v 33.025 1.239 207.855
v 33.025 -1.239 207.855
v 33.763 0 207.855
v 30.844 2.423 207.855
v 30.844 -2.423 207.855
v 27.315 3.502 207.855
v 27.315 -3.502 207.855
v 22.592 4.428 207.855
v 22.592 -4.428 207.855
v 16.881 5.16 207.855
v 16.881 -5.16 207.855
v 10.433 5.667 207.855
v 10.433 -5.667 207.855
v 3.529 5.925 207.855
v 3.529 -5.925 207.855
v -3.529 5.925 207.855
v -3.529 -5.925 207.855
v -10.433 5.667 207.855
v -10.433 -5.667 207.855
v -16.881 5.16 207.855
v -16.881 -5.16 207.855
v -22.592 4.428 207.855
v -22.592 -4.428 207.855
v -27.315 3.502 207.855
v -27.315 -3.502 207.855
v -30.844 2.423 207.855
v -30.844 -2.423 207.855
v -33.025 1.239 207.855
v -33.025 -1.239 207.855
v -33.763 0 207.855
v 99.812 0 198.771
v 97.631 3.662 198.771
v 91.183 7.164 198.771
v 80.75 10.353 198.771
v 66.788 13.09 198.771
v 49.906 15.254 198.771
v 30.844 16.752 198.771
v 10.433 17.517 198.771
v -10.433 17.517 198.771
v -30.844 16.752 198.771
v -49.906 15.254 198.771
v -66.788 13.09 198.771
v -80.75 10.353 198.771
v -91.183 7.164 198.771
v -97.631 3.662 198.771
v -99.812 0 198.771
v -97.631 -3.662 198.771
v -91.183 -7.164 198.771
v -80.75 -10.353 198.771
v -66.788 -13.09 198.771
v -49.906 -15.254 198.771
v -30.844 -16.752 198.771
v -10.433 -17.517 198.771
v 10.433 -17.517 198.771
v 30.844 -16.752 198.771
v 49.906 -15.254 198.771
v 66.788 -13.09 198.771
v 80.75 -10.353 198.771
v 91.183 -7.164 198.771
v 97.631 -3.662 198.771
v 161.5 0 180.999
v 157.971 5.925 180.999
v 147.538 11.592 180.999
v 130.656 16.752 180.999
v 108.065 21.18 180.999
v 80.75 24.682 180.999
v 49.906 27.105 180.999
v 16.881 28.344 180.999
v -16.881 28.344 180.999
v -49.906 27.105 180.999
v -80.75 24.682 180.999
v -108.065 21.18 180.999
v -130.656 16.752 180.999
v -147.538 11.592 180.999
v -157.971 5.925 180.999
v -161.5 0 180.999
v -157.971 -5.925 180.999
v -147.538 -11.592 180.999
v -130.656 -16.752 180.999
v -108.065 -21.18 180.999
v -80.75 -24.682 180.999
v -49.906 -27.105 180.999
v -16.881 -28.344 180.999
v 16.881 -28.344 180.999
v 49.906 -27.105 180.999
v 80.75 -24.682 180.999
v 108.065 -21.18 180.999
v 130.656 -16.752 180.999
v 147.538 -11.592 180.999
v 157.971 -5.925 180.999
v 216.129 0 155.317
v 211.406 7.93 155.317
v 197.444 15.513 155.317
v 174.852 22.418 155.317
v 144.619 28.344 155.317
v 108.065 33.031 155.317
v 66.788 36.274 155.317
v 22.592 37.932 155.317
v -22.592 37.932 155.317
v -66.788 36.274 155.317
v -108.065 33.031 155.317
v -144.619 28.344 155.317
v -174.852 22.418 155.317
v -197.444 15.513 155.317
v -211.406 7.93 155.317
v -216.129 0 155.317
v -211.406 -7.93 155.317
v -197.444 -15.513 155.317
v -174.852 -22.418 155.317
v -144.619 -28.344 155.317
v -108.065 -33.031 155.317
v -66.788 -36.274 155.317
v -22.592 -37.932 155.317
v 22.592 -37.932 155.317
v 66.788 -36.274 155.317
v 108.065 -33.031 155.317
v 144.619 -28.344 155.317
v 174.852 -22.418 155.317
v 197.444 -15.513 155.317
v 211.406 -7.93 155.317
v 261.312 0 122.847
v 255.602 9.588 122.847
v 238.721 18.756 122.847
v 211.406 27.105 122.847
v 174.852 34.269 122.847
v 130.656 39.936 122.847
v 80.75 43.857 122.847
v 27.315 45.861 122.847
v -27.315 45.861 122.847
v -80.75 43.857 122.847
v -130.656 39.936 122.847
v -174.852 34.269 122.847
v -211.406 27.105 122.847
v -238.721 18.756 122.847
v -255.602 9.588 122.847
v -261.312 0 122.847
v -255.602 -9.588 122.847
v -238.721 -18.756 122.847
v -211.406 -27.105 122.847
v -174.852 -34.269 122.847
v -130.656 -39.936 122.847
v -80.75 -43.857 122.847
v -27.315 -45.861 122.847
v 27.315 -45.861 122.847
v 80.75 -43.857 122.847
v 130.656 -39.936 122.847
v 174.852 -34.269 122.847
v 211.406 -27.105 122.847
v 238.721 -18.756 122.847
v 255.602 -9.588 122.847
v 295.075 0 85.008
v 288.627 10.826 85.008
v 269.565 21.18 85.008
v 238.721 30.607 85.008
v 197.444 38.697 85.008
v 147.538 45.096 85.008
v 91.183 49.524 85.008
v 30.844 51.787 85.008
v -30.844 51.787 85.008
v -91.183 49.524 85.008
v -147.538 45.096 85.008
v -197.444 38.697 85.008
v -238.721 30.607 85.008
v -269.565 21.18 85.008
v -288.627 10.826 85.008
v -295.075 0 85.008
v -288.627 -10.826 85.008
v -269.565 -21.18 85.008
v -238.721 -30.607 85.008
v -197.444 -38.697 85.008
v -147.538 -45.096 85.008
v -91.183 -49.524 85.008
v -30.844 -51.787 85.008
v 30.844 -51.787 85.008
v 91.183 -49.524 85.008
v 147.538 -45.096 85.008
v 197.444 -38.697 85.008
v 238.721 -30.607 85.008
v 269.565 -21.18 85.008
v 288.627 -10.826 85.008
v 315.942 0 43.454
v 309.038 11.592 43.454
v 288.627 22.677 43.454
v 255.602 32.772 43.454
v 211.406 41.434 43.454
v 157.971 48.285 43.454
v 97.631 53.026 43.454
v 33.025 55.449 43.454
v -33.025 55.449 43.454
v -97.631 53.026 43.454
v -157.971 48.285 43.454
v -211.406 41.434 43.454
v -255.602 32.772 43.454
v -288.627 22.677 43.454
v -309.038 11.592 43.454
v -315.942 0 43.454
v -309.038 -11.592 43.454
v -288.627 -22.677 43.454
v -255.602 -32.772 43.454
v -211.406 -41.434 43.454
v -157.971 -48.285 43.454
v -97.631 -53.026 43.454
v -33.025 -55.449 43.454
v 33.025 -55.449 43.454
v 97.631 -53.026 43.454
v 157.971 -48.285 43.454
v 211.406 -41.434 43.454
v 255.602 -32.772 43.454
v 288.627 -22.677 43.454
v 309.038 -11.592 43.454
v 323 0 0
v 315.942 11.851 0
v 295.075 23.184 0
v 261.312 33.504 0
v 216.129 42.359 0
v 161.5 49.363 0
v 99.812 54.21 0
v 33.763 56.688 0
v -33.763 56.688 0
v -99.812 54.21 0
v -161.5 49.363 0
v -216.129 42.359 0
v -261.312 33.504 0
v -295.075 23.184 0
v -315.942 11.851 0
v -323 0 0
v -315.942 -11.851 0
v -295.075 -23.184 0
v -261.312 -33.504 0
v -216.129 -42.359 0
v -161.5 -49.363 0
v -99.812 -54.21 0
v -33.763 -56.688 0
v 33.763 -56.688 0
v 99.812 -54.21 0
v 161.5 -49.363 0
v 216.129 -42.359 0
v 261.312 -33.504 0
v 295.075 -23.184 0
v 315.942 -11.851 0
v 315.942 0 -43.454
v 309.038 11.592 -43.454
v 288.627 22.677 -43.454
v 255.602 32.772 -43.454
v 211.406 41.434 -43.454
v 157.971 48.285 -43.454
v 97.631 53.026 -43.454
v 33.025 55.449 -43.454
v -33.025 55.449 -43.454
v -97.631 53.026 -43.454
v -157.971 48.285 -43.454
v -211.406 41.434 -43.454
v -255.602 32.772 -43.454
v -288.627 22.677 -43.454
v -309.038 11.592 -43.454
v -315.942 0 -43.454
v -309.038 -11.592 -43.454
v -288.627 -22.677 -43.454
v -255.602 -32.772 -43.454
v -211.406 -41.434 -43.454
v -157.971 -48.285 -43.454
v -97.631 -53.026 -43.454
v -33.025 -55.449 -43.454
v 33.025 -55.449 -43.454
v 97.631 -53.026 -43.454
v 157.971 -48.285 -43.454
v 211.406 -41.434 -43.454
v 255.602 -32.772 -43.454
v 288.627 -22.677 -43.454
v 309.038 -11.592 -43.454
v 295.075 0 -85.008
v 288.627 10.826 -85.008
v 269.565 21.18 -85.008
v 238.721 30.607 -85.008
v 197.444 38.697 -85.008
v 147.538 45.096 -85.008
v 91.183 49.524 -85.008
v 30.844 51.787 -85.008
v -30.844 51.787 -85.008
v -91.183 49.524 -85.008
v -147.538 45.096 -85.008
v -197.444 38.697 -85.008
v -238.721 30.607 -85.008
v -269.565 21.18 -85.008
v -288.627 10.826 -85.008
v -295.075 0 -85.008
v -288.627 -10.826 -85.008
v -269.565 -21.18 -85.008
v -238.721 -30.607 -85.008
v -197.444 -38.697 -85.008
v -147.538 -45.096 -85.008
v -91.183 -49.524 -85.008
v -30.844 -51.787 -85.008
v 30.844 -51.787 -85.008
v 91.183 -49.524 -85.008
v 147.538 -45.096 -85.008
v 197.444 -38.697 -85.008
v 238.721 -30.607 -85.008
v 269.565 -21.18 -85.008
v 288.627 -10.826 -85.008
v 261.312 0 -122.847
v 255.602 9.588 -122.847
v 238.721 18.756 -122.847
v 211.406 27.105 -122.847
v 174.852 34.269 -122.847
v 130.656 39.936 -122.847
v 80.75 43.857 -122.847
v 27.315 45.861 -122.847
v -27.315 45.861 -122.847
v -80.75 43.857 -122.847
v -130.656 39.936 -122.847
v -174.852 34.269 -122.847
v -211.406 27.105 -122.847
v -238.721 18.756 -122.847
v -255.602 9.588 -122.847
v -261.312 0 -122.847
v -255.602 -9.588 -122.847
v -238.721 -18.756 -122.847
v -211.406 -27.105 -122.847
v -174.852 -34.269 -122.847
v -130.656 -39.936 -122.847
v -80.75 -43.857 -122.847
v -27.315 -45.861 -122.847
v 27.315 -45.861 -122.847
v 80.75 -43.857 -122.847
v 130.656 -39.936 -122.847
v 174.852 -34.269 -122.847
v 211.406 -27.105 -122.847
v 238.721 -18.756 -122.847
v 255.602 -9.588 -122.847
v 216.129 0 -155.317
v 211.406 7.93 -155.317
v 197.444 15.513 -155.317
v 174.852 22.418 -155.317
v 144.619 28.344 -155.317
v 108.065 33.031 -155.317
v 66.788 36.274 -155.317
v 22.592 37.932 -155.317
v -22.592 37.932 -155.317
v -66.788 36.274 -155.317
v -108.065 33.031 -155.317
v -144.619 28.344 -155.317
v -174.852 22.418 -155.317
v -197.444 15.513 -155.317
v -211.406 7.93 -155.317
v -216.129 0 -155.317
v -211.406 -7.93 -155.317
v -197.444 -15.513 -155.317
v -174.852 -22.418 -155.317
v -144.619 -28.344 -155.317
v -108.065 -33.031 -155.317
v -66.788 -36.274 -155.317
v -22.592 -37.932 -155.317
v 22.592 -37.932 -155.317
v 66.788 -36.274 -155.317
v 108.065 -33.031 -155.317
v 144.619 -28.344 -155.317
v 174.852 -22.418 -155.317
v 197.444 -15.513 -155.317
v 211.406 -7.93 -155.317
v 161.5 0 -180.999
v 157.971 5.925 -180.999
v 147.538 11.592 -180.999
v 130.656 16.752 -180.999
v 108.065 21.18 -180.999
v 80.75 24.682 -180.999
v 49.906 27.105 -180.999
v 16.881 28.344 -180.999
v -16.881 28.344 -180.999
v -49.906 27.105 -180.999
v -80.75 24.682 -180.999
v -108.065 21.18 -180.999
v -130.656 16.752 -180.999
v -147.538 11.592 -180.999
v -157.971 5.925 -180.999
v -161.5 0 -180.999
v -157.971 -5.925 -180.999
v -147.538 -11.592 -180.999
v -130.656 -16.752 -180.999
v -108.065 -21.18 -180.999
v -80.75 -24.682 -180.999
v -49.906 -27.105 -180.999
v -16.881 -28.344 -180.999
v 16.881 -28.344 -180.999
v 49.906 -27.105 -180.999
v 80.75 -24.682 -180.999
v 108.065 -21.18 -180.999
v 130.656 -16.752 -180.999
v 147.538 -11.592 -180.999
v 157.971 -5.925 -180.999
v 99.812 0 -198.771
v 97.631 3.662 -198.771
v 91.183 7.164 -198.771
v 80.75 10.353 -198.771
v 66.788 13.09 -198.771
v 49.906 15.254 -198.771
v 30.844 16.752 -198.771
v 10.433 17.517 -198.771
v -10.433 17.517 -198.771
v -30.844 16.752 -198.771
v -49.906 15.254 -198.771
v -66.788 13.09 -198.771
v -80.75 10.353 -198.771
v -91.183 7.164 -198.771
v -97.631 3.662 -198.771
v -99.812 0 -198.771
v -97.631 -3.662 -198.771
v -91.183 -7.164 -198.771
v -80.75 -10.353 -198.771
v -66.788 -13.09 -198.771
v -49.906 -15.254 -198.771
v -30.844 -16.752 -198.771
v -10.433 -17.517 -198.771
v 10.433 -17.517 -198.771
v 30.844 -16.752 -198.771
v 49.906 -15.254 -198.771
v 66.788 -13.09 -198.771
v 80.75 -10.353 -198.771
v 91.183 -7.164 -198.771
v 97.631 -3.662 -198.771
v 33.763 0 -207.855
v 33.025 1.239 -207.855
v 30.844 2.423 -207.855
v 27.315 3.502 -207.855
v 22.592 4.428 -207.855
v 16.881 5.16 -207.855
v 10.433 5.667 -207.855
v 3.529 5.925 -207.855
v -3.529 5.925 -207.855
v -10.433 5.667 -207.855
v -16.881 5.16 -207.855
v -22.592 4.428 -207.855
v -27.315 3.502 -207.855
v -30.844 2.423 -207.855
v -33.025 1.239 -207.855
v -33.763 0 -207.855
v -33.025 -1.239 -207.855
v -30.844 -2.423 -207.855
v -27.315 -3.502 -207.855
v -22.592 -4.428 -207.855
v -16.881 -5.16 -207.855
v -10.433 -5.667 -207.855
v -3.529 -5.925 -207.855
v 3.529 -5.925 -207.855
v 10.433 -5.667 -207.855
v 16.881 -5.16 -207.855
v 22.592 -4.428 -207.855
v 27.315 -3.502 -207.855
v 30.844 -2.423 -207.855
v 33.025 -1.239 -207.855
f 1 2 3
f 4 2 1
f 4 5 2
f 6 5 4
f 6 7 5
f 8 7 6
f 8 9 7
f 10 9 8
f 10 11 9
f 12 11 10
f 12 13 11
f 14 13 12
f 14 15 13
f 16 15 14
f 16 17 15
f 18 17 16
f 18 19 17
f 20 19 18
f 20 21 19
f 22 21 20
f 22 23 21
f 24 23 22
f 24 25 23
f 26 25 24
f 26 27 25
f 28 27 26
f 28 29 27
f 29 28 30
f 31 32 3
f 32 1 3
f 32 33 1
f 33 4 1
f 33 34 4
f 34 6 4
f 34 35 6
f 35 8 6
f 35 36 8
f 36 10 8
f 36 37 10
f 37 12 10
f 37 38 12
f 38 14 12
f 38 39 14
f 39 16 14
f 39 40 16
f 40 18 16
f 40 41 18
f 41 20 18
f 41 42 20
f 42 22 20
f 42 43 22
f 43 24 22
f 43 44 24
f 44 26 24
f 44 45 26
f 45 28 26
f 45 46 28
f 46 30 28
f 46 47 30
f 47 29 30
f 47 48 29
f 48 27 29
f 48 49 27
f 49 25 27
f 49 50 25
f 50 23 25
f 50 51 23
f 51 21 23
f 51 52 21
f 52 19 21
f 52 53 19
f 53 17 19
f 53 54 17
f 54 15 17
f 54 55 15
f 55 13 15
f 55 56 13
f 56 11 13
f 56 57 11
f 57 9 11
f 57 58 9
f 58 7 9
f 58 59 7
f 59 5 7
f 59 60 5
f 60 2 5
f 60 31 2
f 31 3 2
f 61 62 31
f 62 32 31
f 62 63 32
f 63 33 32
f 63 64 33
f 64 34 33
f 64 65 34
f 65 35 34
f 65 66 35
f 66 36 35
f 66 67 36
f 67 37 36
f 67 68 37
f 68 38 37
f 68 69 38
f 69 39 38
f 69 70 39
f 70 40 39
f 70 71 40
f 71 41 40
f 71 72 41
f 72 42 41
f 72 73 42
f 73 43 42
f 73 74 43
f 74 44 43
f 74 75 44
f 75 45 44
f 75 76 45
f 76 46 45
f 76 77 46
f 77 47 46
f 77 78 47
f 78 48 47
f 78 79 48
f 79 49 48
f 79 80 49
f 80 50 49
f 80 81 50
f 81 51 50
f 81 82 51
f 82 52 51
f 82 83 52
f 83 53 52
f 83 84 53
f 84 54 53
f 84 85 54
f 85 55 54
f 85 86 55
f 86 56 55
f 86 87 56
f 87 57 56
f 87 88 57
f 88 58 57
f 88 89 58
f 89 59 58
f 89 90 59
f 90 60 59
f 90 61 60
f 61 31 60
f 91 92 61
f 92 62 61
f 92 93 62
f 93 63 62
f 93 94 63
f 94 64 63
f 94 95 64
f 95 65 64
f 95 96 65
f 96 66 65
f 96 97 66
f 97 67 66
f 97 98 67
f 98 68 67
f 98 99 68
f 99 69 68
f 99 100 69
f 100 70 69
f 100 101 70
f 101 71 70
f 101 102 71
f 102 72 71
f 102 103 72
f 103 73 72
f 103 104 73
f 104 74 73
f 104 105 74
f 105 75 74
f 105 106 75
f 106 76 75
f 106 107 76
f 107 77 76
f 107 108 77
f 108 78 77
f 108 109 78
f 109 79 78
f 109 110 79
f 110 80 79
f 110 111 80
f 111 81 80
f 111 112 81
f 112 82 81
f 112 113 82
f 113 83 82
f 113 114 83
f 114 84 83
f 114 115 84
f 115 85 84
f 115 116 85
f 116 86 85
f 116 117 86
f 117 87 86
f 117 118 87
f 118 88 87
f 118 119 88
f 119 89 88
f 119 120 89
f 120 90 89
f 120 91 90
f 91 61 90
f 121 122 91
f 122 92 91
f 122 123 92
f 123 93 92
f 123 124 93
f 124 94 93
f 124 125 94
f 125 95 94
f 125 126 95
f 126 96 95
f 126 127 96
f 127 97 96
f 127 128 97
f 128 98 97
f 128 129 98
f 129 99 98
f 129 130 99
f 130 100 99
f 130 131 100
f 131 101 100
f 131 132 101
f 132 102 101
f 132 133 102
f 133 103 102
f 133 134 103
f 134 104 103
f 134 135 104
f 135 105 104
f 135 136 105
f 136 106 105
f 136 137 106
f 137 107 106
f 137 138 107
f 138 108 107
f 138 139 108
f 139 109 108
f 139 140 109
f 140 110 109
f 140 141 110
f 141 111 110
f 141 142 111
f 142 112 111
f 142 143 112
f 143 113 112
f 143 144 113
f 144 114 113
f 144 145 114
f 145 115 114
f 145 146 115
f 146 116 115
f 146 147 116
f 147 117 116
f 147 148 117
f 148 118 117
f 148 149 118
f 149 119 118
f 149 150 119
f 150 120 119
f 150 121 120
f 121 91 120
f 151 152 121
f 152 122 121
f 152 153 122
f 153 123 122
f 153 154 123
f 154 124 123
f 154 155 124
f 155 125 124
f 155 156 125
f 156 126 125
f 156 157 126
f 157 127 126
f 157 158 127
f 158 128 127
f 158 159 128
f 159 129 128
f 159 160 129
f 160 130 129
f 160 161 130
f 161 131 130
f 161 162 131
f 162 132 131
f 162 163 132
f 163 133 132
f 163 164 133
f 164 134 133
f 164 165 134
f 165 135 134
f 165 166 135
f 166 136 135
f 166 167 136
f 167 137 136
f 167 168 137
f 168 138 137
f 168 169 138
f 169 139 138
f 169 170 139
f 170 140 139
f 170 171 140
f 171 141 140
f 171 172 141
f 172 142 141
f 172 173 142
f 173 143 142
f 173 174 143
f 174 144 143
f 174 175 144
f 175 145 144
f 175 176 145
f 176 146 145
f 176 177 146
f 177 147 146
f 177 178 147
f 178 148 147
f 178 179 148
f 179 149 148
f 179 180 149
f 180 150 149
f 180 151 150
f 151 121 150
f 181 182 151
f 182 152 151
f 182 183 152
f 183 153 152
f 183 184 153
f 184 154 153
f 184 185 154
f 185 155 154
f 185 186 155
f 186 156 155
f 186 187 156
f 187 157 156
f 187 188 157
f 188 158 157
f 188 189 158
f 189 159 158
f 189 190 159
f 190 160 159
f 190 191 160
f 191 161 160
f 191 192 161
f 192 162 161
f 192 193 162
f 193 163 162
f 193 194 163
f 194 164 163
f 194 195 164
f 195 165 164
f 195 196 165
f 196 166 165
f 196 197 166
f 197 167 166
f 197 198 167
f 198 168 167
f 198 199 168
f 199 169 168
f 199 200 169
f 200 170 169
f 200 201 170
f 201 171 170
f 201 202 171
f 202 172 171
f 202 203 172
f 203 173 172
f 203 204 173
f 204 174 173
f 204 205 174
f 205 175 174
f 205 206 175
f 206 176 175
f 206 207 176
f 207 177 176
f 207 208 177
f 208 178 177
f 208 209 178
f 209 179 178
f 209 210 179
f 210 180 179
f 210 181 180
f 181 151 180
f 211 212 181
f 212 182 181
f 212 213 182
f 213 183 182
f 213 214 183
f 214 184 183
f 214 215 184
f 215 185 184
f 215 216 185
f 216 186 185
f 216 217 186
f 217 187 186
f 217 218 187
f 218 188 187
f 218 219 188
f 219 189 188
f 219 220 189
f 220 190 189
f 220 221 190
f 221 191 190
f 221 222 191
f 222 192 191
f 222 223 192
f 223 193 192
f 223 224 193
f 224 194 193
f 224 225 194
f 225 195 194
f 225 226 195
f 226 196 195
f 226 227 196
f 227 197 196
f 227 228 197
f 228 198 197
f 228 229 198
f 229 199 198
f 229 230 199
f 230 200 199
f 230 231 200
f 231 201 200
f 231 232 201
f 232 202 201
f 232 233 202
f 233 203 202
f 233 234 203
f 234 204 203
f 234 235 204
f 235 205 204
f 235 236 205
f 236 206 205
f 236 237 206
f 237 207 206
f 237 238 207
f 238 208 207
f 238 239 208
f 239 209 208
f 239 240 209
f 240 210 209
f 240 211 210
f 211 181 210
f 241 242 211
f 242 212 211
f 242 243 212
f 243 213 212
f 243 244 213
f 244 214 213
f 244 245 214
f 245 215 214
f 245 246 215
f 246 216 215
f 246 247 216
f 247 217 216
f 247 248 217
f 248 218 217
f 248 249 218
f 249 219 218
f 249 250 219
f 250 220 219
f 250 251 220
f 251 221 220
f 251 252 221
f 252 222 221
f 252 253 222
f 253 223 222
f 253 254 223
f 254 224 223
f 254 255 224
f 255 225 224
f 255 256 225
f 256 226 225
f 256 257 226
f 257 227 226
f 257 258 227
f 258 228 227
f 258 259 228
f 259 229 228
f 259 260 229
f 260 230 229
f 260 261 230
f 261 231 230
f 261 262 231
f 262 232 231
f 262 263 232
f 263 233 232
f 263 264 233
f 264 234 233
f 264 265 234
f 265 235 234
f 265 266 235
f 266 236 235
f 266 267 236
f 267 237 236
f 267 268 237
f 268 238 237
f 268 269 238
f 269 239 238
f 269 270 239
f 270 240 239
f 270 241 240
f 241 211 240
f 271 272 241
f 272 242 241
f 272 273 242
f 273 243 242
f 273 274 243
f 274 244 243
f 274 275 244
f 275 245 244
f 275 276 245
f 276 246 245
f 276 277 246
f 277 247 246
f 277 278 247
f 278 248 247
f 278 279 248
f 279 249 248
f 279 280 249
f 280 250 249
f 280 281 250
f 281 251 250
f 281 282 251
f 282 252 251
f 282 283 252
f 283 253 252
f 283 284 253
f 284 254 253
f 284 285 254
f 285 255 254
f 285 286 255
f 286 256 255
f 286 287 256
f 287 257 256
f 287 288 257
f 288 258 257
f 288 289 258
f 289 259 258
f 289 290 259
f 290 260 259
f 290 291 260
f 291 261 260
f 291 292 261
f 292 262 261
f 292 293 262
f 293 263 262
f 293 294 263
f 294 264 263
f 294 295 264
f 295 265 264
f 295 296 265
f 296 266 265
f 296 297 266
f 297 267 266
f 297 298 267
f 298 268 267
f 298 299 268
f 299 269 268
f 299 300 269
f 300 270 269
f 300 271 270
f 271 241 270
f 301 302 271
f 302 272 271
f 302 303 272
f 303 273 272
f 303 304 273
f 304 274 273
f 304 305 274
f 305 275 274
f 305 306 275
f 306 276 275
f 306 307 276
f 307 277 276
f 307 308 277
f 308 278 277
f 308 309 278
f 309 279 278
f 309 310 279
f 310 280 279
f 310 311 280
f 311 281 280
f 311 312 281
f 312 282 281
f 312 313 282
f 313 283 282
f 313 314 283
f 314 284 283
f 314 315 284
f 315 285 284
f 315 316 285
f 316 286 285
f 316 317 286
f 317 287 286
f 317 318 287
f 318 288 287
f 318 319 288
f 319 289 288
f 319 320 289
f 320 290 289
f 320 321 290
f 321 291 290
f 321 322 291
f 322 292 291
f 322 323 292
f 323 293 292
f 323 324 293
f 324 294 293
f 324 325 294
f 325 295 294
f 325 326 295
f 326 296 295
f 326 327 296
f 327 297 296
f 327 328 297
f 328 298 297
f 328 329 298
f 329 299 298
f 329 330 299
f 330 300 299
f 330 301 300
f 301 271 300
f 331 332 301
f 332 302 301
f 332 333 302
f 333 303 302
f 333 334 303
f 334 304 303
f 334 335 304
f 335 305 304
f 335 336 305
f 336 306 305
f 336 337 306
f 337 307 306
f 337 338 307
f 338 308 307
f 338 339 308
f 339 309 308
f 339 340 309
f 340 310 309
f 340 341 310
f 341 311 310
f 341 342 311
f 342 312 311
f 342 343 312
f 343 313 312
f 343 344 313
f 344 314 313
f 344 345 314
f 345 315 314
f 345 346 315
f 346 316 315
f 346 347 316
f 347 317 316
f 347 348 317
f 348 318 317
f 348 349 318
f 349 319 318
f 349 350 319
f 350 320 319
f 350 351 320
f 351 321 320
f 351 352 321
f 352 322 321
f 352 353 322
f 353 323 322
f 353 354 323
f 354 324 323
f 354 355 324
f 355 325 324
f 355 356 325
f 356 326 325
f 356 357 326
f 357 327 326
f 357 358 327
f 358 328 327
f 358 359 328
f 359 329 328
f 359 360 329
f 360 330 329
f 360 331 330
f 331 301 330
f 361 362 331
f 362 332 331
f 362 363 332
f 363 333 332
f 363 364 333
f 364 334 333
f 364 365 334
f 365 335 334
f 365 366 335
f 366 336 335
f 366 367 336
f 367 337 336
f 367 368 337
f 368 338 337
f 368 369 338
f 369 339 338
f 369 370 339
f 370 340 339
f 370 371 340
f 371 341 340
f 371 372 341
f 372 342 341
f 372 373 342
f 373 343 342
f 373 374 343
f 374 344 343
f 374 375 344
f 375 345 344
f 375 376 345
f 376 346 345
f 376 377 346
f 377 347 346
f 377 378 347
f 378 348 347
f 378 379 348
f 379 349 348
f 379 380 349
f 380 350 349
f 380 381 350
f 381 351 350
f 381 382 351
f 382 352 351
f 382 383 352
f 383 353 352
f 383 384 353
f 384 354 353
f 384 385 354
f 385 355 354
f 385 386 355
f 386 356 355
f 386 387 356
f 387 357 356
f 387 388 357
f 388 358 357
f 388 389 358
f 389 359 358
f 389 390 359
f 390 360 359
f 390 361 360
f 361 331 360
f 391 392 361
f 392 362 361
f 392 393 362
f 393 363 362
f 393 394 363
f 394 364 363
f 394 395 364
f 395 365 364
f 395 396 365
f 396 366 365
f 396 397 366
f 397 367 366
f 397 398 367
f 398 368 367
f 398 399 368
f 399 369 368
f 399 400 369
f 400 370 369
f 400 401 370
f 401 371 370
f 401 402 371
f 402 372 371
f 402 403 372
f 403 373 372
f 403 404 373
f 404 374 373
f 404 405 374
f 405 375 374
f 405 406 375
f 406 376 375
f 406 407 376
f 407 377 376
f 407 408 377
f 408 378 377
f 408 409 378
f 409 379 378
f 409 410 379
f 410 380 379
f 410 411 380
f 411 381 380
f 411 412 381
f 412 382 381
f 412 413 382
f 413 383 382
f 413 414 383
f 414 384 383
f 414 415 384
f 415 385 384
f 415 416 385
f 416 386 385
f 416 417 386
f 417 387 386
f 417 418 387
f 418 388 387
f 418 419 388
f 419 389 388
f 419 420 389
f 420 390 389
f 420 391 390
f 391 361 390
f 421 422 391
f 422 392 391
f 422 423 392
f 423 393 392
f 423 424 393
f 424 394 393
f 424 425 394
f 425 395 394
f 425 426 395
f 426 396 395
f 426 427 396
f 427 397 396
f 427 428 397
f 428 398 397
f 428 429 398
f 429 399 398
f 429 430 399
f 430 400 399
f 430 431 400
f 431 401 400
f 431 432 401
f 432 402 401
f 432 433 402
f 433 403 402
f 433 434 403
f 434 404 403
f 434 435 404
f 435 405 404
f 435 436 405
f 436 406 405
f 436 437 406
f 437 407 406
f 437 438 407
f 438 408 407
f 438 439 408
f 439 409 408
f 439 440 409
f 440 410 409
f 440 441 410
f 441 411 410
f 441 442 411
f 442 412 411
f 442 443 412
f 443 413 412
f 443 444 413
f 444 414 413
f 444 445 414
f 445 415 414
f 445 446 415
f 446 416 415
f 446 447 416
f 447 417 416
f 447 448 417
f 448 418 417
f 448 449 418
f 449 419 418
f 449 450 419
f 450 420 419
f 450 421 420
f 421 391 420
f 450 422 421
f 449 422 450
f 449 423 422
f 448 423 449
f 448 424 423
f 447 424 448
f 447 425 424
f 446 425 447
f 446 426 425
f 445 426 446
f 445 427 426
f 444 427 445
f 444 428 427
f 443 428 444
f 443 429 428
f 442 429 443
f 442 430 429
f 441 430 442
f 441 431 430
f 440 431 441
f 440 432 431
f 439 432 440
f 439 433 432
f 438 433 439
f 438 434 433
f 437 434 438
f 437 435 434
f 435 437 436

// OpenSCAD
// Generated by SolidPython 1.0.1 on 2020-07-29 00:46:52


scale(v = [17, 3, 11]) {
	sphere(r = 19);
}
/***********************************************
*********      SolidPython code:      **********
************************************************
 
# import packages: SolidPython
from solid import *
from solid.utils import *
from itertools import chain, combinations, permutations


class Resize:

    def __init__(self, scad_file):
        self.scad_file = scad_file
        #self.scad_file = import_scad(scad_file)
        # cone/cylinder param:
        self.r1 = 0
        self.r2 = 0
        self.h = 0
        # rectangular prism param:
        self.w = 0
        self.l = 0
        # ellipse param:
        self.r = 0

    # import OpenScad code (file name corresponds to shape)


    # classify shape + parameters
    def assign(self, param1, param2, param3):
        if self.scad_file == 'cone.scad':
            self.r1 = param1
            self.r2 = param2
            self.h = param3
        elif self.scad_file == 'cylinder.scad':
            self.r1 = param1
            self.r2 = param2
            self.h = param3
        elif self.scad_file == 'rectangularPrism.scad':
            self.h = param1
            self.l = param2
            self.w = param3
        else:
            self.r = param1
            self.h = param2

    # resize parameters
    def iterate(self):
        x = range(3, 20, 2)
        i = 1
        if self.scad_file == 'cone.scad':
            tempList = list(permutations(x, 2))
            for temp in tempList:
                param1 = temp[0]
                param2 = temp[1]
                filepath = 'produced_scad_files/' + 'cone' + str(param1) + '_' + str(param2) + '_' + '.scad'
                scad_render_to_file(cylinder(h=param1, r1=param2, r2=0), filepath)

        elif self.scad_file == 'cylinder.scad':
            tempList = list(permutations(x, 3))
            for temp in tempList:
                param1 = temp[0]
                param2 = temp[1]
                filepath = 'produced_scad_files/' + 'cylinder' + str(param1) + '_' + str(param2) + '_' + '.scad'
                scad_render_to_file(cylinder(h=param1, r1=param2, r2=param2), filepath)

        elif self.scad_file == 'rectangularPrism.scad':
            tempList = list(permutations(x, 3))
            for temp in tempList:
                param1 = temp[0]
                param2 = temp[1]
                param3 = temp[2]
                filepath = 'produced_scad_files/' + 'rectangularPrism' + str(param1) + '_' + str(param2) + '_' + str(
                    param3) + '.scad'
                scad_render_to_file(cube(size=(param1, param2, param3)), filepath)

        elif self.scad_file == 'ellipse.scad':
            tempList = list(permutations(x, 4))
            for temp in tempList:
                param1 = temp[0]
                param2 = temp[1]
                param3 = temp[2]
                param4 = temp[3]
                filepath = 'produced_scad_files/' + 'ellipse' + str(param1) + '_' + str(param2) + '_' + str(param3) + '_' + str(param4) + '.scad'
                scad_render_to_file(scale([param1, param2, param3])(sphere(r=param4)), filepath)

    def render_to_scadfile(self):
        scad_render_to_file(scad, 'example.scad') 
 
************************************************/
